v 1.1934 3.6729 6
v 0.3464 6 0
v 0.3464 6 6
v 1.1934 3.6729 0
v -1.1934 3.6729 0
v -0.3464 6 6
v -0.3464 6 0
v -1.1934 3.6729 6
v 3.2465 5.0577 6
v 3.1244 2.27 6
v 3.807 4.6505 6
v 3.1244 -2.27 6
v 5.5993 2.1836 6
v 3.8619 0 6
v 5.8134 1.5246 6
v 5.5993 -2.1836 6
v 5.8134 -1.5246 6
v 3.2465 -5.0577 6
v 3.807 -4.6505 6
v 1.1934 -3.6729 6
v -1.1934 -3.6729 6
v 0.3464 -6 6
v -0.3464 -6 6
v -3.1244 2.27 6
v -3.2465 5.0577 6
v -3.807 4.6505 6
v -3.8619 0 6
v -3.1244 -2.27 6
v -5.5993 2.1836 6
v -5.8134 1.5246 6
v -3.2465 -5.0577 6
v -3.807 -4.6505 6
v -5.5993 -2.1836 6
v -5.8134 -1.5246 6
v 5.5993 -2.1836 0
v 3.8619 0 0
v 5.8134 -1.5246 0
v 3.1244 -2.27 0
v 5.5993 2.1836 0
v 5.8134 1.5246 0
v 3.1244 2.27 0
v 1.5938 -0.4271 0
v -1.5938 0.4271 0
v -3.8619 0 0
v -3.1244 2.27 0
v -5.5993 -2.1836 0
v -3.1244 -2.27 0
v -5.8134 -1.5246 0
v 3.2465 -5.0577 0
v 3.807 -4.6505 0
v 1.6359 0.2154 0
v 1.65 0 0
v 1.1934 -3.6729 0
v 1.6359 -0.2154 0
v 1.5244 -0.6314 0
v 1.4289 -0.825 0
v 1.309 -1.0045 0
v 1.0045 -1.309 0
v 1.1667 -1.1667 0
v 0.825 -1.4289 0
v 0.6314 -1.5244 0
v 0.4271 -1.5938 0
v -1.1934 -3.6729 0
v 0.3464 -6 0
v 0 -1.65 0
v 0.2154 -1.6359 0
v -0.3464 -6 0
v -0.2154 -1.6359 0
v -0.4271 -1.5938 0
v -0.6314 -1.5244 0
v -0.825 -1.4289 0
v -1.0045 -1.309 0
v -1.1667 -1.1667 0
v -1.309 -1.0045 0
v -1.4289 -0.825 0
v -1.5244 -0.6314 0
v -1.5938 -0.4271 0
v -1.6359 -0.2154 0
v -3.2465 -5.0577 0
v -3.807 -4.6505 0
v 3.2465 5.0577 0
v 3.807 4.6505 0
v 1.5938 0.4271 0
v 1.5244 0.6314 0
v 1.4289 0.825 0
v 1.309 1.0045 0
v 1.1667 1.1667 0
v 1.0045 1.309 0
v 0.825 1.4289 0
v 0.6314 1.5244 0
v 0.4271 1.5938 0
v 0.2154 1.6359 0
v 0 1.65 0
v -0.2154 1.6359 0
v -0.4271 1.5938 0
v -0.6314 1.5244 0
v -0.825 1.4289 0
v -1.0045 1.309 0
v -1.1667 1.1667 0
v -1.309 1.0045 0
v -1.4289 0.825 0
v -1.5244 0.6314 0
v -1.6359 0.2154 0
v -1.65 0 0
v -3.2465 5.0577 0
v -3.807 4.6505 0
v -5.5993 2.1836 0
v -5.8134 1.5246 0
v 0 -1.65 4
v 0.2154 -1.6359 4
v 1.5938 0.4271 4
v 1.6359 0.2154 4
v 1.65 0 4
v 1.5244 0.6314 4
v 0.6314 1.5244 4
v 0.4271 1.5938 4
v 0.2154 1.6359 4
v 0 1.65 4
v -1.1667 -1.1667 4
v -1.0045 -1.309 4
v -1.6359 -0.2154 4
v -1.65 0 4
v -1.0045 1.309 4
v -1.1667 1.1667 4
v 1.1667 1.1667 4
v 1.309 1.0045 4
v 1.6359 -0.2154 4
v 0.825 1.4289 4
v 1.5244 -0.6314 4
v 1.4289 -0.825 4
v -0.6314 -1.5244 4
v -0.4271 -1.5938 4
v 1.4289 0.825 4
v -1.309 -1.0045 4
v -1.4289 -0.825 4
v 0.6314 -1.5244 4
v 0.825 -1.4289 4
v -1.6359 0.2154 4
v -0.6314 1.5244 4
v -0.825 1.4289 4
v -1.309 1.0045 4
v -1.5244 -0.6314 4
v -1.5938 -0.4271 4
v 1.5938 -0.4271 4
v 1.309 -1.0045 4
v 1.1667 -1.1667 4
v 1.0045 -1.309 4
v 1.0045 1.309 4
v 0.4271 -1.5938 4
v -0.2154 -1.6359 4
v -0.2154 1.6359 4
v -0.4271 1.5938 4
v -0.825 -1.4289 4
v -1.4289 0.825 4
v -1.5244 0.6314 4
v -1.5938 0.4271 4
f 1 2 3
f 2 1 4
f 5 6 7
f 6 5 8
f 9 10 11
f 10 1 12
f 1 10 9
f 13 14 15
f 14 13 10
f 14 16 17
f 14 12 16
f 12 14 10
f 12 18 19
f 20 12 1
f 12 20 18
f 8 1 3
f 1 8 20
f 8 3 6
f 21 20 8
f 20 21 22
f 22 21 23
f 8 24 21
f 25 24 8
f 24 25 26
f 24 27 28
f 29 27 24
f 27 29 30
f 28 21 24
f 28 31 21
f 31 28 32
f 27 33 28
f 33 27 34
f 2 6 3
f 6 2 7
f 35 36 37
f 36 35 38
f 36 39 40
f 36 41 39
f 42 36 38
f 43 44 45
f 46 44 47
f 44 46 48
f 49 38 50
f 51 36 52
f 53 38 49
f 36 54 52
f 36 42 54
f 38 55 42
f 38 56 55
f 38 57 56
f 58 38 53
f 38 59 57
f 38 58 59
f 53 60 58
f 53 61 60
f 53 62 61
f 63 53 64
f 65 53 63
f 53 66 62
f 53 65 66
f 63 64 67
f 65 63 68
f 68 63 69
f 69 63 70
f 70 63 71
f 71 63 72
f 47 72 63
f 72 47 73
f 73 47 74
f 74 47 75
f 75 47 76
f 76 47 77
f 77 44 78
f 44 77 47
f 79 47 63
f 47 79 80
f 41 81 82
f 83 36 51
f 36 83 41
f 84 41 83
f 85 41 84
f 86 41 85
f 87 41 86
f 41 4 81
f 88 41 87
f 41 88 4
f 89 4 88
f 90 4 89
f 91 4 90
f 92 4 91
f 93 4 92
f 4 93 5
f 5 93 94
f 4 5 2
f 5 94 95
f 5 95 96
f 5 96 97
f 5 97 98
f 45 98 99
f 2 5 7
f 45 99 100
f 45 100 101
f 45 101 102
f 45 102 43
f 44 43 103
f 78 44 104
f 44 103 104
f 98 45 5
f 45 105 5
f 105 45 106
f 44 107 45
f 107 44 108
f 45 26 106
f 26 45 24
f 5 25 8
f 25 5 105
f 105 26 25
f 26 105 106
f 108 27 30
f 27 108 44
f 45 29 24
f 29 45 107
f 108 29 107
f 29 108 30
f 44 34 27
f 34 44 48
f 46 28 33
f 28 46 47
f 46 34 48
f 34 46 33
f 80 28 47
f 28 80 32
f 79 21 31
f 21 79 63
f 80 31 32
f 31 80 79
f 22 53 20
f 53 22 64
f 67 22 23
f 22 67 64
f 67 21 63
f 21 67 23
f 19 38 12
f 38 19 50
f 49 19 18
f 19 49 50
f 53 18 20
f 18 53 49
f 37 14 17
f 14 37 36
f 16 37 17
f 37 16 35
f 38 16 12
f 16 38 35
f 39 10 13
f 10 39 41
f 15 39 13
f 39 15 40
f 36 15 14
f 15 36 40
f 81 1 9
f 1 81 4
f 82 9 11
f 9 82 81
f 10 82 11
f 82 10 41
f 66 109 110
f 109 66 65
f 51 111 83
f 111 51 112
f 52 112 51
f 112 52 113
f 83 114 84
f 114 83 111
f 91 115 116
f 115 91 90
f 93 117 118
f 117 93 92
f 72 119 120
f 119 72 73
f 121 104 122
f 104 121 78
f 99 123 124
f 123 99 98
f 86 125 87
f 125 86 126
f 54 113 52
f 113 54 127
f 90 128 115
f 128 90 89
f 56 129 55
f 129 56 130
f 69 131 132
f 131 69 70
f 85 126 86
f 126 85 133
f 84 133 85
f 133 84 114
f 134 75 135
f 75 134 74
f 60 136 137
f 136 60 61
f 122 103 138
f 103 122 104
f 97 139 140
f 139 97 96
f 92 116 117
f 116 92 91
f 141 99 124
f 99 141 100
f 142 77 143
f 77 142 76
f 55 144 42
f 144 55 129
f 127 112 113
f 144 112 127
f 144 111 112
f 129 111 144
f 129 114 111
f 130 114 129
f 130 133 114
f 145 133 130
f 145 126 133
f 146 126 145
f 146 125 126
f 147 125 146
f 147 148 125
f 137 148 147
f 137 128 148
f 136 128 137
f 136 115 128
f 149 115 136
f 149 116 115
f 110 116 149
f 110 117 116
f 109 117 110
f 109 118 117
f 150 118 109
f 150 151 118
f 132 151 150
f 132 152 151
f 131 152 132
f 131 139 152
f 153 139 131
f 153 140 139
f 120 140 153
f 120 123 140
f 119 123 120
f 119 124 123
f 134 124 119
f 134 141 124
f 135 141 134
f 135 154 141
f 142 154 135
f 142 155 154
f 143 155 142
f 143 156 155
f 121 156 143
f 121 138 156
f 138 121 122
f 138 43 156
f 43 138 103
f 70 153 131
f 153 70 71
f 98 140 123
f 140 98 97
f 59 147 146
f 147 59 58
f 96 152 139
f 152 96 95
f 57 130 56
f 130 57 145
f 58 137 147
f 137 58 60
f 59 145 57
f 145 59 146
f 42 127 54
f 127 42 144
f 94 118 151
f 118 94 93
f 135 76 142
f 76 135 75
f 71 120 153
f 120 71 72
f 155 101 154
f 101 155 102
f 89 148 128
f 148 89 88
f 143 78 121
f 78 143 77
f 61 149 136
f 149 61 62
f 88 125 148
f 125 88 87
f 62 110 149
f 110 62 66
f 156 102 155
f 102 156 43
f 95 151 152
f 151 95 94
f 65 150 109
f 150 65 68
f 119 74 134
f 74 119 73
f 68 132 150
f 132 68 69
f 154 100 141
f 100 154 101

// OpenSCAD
// file: gearlib.scad
// =====================================================================
//  齿轮生成器（梯形齿廓，3D 布尔并集）
//
//  为什么不用渐开线 + 2D 并集：
//    渐开线齿廓拼成单一闭合多边形时，齿根圆弧与相邻齿面在端点处重合，
//    OpenSCAD 的 2D 三角化会产生自交/退化面，挤出后网格不封闭。
//
//  这里改为：根圆柱 + 逐个梯形齿块，齿块底部径向内嵌到 rf−0.6，
//  形成**体积重叠**而非面接触，布尔并集稳定，导出必为封闭流形。
//
//  齿廓用直线代替渐开线：对 3D 打印的玩具齿轮（低速、轻载）精度足够，
//  且齿侧留 0.15mm 齿隙，装配不咬死。
// =====================================================================

module tooth_prism(z = 20, m = 1, t = 6, clearance = 0.15) {
    p  = PI * m;                      // 周节
    rp = m * z / 2;
    ra = rp + m;
    rf = max(1.2, rp - 1.25 * m);
    rb = rf - 0.6;                    // 底部内嵌半径（保证与根圆重叠）

    hw_p = p / 4 - clearance / 2;     // 分度圆处半齿宽
    k    = tan(20);                   // 压力角正切

    hw_b = hw_p + (rp - rb) * k;      // 底部半宽
    hw_a = max(0.12, hw_p - (ra - rp) * k);   // 顶部半宽

    linear_extrude(height = t, convexity = 4)
        polygon([[-hw_b, rb], [hw_b, rb], [hw_a, ra], [-hw_a, ra]]);
}

module gear(z = 20, m = 1, t = 6, bore = 0, clearance = 0.15) {
    rp = m * z / 2;
    rf = max(1.2, rp - 1.25 * m);

    difference() {
        union() {
            cylinder(r = rf, h = t, $fn = max(48, z * 6));
            for (k = [0 : z - 1])
                rotate([0, 0, k * 360 / z])
                    translate([0, 0, 0])
                        tooth_prism(z = z, m = m, t = t, clearance = clearance);
        }
        if (bore > 0)
            cylinder(d = bore, h = t + 2, center = true, $fn = 48);
    }
}

/* 齿条齿块（供滑块使用） */
module rack_teeth(len, m = 1, t = 2.25, pa = 20) {
    p   = PI * m;
    n   = floor(len / p);
    hw1 = p / 4 + m * tan(pa);
    hw2 = p / 4 - m * tan(pa);
    for (i = [0 : n - 1])
        translate([i * p, 0, 0])
            linear_extrude(height = t, convexity = 4)
                polygon([[-hw1, -0.6], [hw1, -0.6], [hw2, t], [-hw2, t]]);
}
// file: params.scad
// =====================================================================
//  皮筋储能自动循环发射器 —— 全局参数
//  mechanical/elastic-launcher/
//
//  坐标系：
//    X = 发射方向（0 = 尾端，base_x = 前端枪口）
//    Y = 横向（0 = 弹道中心线）
//    Z = 垂直（0 = 桌面，底板占 0..base_t）
//
//  机构链：
//    电机 → 两级齿轮 1:25 → 曲柄盘 → C 形拨叉拖滑块后移（皮筋张紧）
//    → 曲柄销脱出拨叉 → 皮筋释放 → 击针前冲击发 → 曲柄销重新咬合
//
//  一次循环 = 曲柄盘转一圈 = 一发
// =====================================================================

$fn = 96;

/* ================= 底板 ================= */
base_x    = 120;
base_y    = 65;
base_t    = 6;
corner_r  = 3;

/* ================= 弹道 ================= */
bore      = 13;     // 通道内宽
barrel_x0 = 74;     // 筒起点
barrel_x1 = 120;    // 枪口
wall      = 2.4;    // 壁厚
barrel_h  = 22;     // 侧壁高（底板顶面起）

/* ================= 弹丸 ================= */
ball_d    = 11;
feed_x    = 82;     // 弹仓落弹点 X（须在击针静止位之前）
mag_h     = 40;     // 弹仓高出筒顶

/* ================= 皮筋储能 ================= */
band_n    = 3;      // 皮筋根数（并联）
band_k    = 80;     // 单根刚度 N/m
stroke    = 22;     // 击发行程 = 皮筋拉伸量（受底板长度限制）
pinion_x  = 28;     // 齿条驱动小齿轮中心 X
anchor_x  = 108;    // 皮筋前锚点 X

/* ================= 击发滑块 ================= */
sled_w    = 14;     // 滑块宽
sled_body_l = 30;   // 滑块本体长
rod_l     = 22;     // 击针长
rod_d     = 4;      // 击针直径

/* ================= 齿轮（两级 1:25） ================= */
gear_m    = 1.0;    // 模数
gear_pa   = 20;     // 压力角（度）
z_small   = 10;
z_big     = 50;
gear_t    = 6;      // 齿轮厚
shaft_d   = 3.0;    // 轴径（打印轴或钢轴）

// 中心距 = (z1+z2)*m/2 = 30
center_d  = (z_small + z_big) * gear_m / 2;

// 电机
motor_d   = 24.4;   // 130 型外壳直径
motor_l   = 38;
motor_x   = 88;     // 与输出小齿轮同轴
motor_z   = 22;      // 与齿轮轴同高

// 齿轮层（Y 方向错开，避免 50 齿互相干涉）
layer1_y  = 15;
layer2_y  = 23;

/* ================= 紧固件 ================= */
screw_d   = 2.4;
m3_d      = 3.4;
// file: parts.scad
// =====================================================================
//  皮筋储能自动循环发射器 —— 零件模块库
//  include <params.scad> 后调用；本文件自身不产生几何体
// =====================================================================

include <params.scad>
include <gearlib.scad>

/* ---------------------------------------------------------------
   通用：圆角矩形板
   --------------------------------------------------------------- */
module rrect(x0, y0, x1, y1, z0, z1, r) {
    hull()
        for (x = [x0 + r, x1 - r])
            for (y = [y0 + r, y1 - r])
                translate([x, y, z0]) cylinder(r = r, h = z1 - z0);
}

/* ---------------------------------------------------------------
   齿条齿形（梯形近似，模数 m）
   --------------------------------------------------------------- */
module rack_teeth(len, m = 1, t = 2.25, pa = 20) {
    p   = PI * m;
    n   = floor(len / p);
    hw1 = p / 4 + m * tan(pa);   // 齿根半宽
    hw2 = p / 4 - m * tan(pa);   // 齿顶半宽
    for (i = [0 : n - 1])
        translate([i * p, 0, 0])
            linear_extrude(height = t, convexity = 4)
                polygon([[-hw1, 0], [-hw2, t], [hw2, t], [hw1, 0]]);
}

/* ===============================================================
   1. 底板 base-plate
   =============================================================== */
module base_plate() {
    difference() {
        rrect(0, -base_y / 2, base_x, base_y / 2, 0, base_t, corner_r);

        // 滑块导轨槽（两条，限制滑块只能沿 X 滑动）
        for (s = [-1, 1])
            translate([8, s * sled_w / 2, base_t - 2])
                cube([70, 1.6, 4]);

        // 齿轮箱固定孔
        for (x = [28, 58, 88])
            translate([x, 34, -1]) cylinder(d = screw_d, h = base_t + 2);

        // 皮筋锚架固定孔
        for (s = [-1, 1])
            translate([112, s * 20, -1]) cylinder(d = screw_d, h = base_t + 2);

        // 弹道筒固定孔
        for (x = [70, 122])
            for (s = [-1, 1])
                translate([x, s * (bore / 2 + wall / 2), -1])
                    cylinder(d = screw_d, h = base_t + 2);

        // 按钮座孔
        translate([100, -26, -1]) cylinder(d = screw_d, h = base_t + 2);

        // 减重槽
        for (x = [16, 44])
            translate([x, -18, 1.5]) hull() {
                translate([-5, -5, 0]) cylinder(r = 2.5, h = base_t);
                translate([5, -5, 0]) cylinder(r = 2.5, h = base_t);
                translate([-5, 5, 0]) cylinder(r = 2.5, h = base_t);
                translate([5, 5, 0]) cylinder(r = 2.5, h = base_t);
            }
    }
}

/* ===============================================================
   2. 击发滑块 striker（齿条 + 击针 + 皮筋挂钩）
   =============================================================== */
module striker() {
    // 本体
    translate([0, -sled_w / 2, base_t])
        cube([sled_body_l, sled_w, 11]);
    // 齿条：位于本体顶面，长度 = 行程
    translate([4, -sled_w / 2, base_t + 11])
        cube([stroke, sled_w, 1.2]);
    translate([4, -sled_w / 2, base_t + 11])
        rack_teeth(stroke, gear_m, 2.25);
    // 击针
    translate([sled_body_l, 0, base_t + 5])
        rotate([0, 90, 0])
            cylinder(d = rod_d, h = rod_l);
    // 皮筋挂钩（后端）
    translate([-2, 0, base_t + 3])
        rotate([0, 90, 0])
            cylinder(d = 5, h = 4);
}

/* ===============================================================
   3. 弹道筒 barrel（含侧向落弹孔）
   =============================================================== */
module barrel() {
    z0 = base_t;
    difference() {
        // 外形
        translate([barrel_x0, -bore / 2 - wall, z0])
            cube([barrel_x1 - barrel_x0, bore + 2 * wall, barrel_h]);
        // 内腔
        translate([barrel_x0 - 1, -bore / 2, z0 - 1])
            cube([barrel_x1 - barrel_x0 + 2, bore, barrel_h + 1]);
        // 落弹孔（顶部，Ø = 弹丸 + 间隙）
        translate([feed_x, 0, z0 + barrel_h - 1])
            cylinder(d = ball_d + 0.6, h = 4);
        // 弹仓内腔
        translate([feed_x, 0, z0 + barrel_h])
            cylinder(d = ball_d + 0.6, h = mag_h + 1);
    }
    // 弹仓外壁
    difference() {
        translate([feed_x, 0, z0 + barrel_h])
            cylinder(d = ball_d + 0.6 + 2 * wall, h = mag_h);
        translate([feed_x, 0, z0 + barrel_h - 1])
            cylinder(d = ball_d + 0.6, h = mag_h + 2);
    }
}

/* ===============================================================
   4. 齿轮箱 gearbox（电机夹 + 三根轴支撑）
   =============================================================== */
module gearbox() {
    yp = 29;            // 立板起始 Y（在齿轮层之外，避免干涉）
    pt = 5;             // 立板厚

    // 立板 + 三处轴座
    difference() {
        union() {
            translate([8, yp, base_t])
                cube([92, pt, 46]);
            // 轴座凸台
            for (x = [28, 58, 88])
                translate([x, yp - 4, 22])
                    rotate([-90, 0, 0])
                        cylinder(d = 12, h = pt + 4);
            // 电机夹持筒
            translate([88, yp, 22])
                rotate([-90, 0, 0])
                    cylinder(d = motor_d + 6, h = 20);
        }
        // 三个轴承孔
        for (x = [28, 58, 88])
            translate([x, yp - 5, 22])
                rotate([-90, 0, 0])
                    cylinder(d = shaft_d + 0.4, h = pt + 8);
        // 电机腔
        translate([88, yp - 1, 22])
            rotate([-90, 0, 0])
                cylinder(d = motor_d + 0.4, h = 19);
        // 减重
        for (x = [40, 70])
            translate([x, yp - 1, base_t + 10])
                cube([14, pt + 2, 20]);
        // 底板固定孔
        for (x = [28, 58, 88])
            translate([x, yp + 2, base_t - 1])
                cylinder(d = screw_d, h = 8);
    }
}

/* ===============================================================
   5. 皮筋前锚架 band-frame（含击针导套）
   =============================================================== */
module band_frame() {
    difference() {
        union() {
            // 立架（两侧翼，皮筋从 y=±13 走线，避开弹道筒）
            translate([108, -26, base_t])
                cube([6, 52, 26]);
            // 击针导套
            translate([barrel_x0 - 12, 0, base_t + 5])
                rotate([0, 90, 0])
                    cylinder(d = rod_d + 2, h = 12);
        }
        // 皮筋挂槽（y=±13）
        for (s = [-1, 1])
            translate([107, s * 13 - 2, base_t + 16])
                cube([8, 4, 8]);
        // 导套内孔
        translate([barrel_x0 - 13, 0, base_t + 5])
            rotate([0, 90, 0])
                cylinder(d = rod_d + 0.4, h = 14);
        // 底板固定
        for (s = [-1, 1])
            translate([111, s * 20, base_t - 1])
                cylinder(d = screw_d, h = 8);
    }
}

/* ===============================================================
   6. 按钮座 button-mount
   =============================================================== */
module button_mount() {
    difference() {
        union() {
            translate([90, -32, base_t]) cube([20, 14, 4]);
            translate([90, -22, base_t]) cube([20, 4, 16]);
        }
        translate([100, -20, base_t + 9])
            rotate([-90, 0, 0]) cylinder(d = 12.2, h = 6);
        translate([100, -26, base_t - 1]) cylinder(d = screw_d, h = 6);
    }
}
// main file
include <parts.scad>

gear(z = z_small, m = gear_m, t = gear_t, bore = shaft_d + 0.3);
